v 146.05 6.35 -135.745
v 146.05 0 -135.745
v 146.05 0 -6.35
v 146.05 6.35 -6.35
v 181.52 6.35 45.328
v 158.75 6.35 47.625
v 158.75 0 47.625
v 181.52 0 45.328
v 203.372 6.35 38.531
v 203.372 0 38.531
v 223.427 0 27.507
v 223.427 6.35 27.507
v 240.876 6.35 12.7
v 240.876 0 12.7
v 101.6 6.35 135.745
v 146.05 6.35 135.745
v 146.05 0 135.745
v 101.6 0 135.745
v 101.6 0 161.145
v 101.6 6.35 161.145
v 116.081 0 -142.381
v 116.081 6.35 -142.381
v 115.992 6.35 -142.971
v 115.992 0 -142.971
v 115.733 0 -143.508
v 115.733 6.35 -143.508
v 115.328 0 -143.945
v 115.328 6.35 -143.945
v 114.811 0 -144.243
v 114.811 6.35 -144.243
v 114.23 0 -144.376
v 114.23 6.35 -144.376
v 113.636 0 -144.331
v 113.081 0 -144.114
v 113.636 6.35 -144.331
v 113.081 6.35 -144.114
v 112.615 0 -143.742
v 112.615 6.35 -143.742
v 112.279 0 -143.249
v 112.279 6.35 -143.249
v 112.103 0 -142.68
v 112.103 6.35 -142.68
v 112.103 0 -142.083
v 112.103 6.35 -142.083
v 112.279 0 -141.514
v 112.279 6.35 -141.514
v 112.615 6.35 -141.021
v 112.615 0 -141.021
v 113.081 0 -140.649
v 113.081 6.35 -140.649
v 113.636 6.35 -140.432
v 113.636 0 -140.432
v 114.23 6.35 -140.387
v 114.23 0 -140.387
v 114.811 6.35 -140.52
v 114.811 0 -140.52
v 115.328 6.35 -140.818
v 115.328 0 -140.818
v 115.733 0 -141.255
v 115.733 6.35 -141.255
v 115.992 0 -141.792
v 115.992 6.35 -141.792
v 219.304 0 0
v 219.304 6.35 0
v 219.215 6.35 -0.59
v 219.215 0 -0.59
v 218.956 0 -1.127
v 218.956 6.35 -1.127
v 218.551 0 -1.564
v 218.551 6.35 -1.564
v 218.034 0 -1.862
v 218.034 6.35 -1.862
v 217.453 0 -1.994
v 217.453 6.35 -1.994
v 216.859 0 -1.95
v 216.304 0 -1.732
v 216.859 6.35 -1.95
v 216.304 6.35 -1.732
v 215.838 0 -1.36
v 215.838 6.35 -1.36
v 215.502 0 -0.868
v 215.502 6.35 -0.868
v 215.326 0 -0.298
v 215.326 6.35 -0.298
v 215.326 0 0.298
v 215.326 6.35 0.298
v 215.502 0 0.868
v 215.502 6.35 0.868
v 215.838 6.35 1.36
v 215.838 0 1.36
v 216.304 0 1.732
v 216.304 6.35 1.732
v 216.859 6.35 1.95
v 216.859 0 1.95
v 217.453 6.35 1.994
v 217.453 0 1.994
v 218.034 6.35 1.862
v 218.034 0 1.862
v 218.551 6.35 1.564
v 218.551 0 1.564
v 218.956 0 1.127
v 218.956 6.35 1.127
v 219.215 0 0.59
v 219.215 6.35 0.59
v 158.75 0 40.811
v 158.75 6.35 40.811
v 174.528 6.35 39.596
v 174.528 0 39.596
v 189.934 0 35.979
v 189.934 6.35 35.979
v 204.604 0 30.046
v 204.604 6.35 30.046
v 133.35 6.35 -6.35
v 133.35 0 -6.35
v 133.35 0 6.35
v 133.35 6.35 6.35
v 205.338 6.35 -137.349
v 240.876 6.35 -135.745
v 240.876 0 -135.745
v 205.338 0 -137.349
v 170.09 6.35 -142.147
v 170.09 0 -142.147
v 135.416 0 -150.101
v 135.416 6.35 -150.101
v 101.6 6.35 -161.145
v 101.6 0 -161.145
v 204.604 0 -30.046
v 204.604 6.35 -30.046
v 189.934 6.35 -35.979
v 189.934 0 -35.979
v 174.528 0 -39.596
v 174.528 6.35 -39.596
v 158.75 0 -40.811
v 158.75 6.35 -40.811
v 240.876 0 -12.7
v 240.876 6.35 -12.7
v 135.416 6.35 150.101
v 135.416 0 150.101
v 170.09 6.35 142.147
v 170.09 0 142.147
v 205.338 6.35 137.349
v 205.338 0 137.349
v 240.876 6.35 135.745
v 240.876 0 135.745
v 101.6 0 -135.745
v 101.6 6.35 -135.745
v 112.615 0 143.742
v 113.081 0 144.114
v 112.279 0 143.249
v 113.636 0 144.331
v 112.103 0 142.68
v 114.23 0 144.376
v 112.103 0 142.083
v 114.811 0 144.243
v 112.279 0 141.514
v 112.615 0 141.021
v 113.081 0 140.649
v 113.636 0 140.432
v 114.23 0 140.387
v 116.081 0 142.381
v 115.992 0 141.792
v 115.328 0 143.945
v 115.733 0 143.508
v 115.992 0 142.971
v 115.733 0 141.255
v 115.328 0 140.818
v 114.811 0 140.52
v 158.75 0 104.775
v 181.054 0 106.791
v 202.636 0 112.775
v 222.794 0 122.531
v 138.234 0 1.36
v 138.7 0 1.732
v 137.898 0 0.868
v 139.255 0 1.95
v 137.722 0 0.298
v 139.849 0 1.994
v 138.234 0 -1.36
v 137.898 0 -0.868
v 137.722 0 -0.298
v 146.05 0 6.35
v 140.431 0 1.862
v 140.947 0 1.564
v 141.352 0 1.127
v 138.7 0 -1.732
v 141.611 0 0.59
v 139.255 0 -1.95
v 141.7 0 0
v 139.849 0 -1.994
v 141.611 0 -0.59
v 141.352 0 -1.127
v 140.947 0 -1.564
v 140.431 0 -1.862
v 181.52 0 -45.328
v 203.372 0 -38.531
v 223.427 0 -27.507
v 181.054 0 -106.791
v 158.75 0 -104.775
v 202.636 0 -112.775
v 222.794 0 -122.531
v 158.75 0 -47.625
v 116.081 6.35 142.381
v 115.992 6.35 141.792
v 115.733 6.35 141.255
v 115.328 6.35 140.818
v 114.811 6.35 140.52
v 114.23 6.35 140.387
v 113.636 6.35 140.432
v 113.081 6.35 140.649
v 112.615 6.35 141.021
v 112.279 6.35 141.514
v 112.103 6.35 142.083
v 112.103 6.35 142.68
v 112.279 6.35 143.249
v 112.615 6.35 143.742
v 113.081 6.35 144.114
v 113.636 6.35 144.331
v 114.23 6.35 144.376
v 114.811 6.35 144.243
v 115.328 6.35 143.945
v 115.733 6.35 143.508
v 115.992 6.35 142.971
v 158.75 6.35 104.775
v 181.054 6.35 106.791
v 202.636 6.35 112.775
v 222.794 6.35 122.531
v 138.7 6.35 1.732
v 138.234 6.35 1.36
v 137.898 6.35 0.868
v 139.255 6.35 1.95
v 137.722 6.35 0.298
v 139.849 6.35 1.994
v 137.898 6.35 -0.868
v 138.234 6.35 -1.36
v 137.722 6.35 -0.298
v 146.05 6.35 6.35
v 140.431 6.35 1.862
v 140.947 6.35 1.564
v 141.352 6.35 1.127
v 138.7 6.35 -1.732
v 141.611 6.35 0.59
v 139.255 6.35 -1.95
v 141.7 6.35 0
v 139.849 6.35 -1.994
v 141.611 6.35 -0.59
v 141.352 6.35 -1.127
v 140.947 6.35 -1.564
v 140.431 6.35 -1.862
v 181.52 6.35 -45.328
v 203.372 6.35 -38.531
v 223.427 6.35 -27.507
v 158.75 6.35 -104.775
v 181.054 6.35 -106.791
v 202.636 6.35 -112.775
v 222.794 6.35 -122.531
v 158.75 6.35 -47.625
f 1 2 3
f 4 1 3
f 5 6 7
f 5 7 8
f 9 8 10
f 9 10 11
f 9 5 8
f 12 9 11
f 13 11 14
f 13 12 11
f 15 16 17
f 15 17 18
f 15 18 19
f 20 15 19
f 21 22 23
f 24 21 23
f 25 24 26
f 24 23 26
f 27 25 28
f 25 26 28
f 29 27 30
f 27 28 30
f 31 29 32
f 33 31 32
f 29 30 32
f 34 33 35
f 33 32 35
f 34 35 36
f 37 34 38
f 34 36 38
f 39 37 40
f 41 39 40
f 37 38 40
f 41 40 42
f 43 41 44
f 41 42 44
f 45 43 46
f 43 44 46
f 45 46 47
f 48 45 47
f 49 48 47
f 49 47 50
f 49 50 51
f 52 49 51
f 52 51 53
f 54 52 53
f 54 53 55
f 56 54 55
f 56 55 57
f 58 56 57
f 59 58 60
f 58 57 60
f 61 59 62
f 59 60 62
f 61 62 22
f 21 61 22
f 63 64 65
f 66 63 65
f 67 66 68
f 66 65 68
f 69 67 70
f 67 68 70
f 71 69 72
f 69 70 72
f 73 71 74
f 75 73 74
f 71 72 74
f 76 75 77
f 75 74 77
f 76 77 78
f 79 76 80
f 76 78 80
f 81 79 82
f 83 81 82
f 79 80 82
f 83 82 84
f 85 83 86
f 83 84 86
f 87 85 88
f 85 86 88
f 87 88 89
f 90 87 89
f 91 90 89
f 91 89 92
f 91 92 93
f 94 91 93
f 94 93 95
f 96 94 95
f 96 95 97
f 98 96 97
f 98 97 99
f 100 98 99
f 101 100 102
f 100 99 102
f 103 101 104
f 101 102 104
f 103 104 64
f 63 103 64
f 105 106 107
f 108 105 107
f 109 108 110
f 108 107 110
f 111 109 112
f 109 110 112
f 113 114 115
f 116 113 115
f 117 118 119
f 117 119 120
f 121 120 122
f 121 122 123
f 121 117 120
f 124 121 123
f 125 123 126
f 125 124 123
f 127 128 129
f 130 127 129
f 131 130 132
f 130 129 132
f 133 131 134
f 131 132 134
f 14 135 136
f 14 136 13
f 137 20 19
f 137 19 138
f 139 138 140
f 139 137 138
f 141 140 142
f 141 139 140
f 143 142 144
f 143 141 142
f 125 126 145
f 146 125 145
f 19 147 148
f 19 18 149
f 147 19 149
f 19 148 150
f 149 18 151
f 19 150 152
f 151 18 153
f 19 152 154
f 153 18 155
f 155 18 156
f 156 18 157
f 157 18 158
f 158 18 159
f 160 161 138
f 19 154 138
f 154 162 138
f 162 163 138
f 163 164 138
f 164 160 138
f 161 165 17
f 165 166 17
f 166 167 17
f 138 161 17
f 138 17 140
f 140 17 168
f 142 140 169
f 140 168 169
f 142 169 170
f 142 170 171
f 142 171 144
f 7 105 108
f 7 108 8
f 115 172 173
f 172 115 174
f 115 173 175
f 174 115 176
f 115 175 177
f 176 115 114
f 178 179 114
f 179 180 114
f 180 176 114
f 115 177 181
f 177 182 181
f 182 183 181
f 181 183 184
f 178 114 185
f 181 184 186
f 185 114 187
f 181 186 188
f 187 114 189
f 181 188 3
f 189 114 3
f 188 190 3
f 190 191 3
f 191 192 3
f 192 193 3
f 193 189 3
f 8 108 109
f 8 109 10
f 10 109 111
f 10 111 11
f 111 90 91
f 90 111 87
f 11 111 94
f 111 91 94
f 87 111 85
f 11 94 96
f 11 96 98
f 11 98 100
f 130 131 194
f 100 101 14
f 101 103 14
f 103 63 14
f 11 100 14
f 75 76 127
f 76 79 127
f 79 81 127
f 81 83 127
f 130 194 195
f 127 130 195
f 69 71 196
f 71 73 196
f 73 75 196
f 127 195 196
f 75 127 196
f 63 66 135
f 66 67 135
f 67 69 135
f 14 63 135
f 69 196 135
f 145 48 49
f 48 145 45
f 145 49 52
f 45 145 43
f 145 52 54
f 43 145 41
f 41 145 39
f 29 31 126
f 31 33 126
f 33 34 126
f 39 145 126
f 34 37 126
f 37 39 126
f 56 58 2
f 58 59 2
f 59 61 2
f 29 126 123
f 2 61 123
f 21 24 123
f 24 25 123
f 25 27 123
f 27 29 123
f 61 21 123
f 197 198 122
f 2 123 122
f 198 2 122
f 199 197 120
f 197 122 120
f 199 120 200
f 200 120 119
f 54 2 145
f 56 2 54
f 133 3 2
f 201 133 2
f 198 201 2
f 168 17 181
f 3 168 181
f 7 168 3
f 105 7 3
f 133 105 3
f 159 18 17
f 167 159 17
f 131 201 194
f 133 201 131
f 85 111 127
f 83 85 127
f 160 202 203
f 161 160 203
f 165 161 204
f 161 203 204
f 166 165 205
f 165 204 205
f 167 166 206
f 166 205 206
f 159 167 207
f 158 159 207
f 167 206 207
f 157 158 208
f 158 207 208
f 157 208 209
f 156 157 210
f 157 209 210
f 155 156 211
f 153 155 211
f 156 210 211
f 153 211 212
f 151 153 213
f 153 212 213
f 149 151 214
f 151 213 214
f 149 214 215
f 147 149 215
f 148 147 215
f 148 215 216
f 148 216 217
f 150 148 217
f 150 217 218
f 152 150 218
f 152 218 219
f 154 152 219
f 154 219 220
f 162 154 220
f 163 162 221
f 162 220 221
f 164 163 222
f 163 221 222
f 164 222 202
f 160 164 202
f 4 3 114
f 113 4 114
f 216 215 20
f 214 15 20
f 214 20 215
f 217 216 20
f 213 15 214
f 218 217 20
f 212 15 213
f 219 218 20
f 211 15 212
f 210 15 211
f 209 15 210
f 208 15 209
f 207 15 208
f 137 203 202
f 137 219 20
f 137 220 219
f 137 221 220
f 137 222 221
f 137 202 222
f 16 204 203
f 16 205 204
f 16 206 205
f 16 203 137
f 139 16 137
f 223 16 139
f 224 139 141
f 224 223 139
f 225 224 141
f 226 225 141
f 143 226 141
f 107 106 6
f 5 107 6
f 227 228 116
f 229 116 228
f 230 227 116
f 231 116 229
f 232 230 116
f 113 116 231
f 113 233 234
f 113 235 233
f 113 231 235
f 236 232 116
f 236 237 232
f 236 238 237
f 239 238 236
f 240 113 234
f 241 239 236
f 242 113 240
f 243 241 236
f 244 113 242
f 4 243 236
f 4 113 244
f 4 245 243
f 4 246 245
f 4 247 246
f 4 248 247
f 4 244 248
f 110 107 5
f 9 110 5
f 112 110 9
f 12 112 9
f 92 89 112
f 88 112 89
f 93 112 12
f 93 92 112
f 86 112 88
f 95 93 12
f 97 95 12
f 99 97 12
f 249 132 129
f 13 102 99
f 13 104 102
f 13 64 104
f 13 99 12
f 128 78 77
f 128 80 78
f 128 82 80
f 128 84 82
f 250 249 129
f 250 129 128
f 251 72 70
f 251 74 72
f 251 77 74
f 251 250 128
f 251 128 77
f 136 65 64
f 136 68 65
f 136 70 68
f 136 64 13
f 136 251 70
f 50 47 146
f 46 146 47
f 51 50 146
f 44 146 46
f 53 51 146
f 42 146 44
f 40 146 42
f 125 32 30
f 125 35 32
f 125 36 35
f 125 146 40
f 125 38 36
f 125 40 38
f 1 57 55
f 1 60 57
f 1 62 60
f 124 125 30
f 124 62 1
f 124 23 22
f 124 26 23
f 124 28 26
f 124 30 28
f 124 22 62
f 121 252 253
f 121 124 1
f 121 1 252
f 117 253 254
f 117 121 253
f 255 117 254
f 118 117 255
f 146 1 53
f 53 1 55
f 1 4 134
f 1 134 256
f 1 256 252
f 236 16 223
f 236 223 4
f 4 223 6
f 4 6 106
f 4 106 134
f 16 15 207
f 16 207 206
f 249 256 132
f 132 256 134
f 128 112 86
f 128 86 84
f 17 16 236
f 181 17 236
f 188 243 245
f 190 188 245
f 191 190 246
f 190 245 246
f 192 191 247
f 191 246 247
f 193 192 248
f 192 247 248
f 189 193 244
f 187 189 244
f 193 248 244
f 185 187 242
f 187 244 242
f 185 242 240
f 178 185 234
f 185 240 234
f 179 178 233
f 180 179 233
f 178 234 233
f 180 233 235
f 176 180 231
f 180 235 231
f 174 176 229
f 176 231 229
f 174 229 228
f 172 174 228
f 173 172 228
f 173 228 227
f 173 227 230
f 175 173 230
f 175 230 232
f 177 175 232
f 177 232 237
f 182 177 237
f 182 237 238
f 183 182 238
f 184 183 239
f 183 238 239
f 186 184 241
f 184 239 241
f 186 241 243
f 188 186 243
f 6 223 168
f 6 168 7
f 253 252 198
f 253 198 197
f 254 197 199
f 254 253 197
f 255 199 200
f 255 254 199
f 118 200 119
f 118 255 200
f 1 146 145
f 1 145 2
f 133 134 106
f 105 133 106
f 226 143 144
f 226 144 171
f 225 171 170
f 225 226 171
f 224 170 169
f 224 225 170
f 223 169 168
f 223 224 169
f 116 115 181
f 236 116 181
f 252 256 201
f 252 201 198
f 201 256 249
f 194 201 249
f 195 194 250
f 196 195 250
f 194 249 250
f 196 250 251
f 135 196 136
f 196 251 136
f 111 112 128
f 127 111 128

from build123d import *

# Parameters (mm, degrees)
BOSS_EXTRUDE3_DEPTH = 6.35
SKETCH2_R           = 2
CUT_EXTRUDE1_DEPTH  = 6.35
SKETCH3_W           = 44.45
SKETCH3_H           = 34.144934764
CUT_EXTRUDE2_DEPTH  = 6.35
BOSS_EXTRUDE5_DEPTH = 6.35
CUT_EXTRUDE3_DEPTH  = 6.35
CUT_EXTRUDE4_DEPTH  = 6.35
SKETCH8_R           = 2
CUT_EXTRUDE5_DEPTH  = 6.35


with BuildPart() as part:
    # Sketch1 → Boss-Extrude3 (new body)
    with BuildSketch(Plane(origin=(0, 0, 0), x_dir=(1, 0, 0), z_dir=(0, 1, 0))):
        with BuildLine():
            ThreePointArc((101.6, -161.144934764), (118.310930869, -149.307647617), (133.654639598, -135.744934764))
            Line((133.654639598, -135.744934764), (124.436872293, -135.744934764))
            Line((124.436872293, -135.744934764), (101.6, -135.744934764))
            Line((101.6, -135.744934764), (101.6, -161.144934764))
        make_face()
        with BuildLine():
            Line((146.05, -112.163363002), (146.05, -101.6))
            Line((146.05, -101.6), (101.6, -101.6))
            Line((101.6, -101.6), (101.6, -135.744934764))
            Line((101.6, -135.744934764), (124.436872293, -135.744934764))
            ThreePointArc((124.436872293, -135.744934764), (135.756435031, -124.424325787), (146.05, -112.163363002))
        make_face()
        with BuildLine():
            Line((152.4, -76.2), (152.4, -101.6))
            Line((152.4, -101.6), (157.687433266, -106.887433266))
            ThreePointArc((157.687433266, -106.887433266), (155.08800922, -110.62531083), (152.4, -114.3))
            ThreePointArc((152.4, -114.3), (143.428677452, -125.373300524), (133.654639598, -135.744934764))
            Line((133.654639598, -135.744934764), (190.5, -135.744934764))
            Line((190.5, -135.744934764), (240.876195248, -135.744934764))
            ThreePointArc((240.876195248, -135.744934764), (203.220744642, -110.47631512), (158.75, -101.6))
            Line((158.75, -101.6), (158.75, -76.2))
            Line((158.75, -76.2), (152.4, -76.2))
        make_face()
        with BuildLine():
            Line((146.05, -76.2), (152.4, -76.2))
            Line((152.4, -76.2), (152.4, -50.8))
            Line((152.4, -50.8), (190.076195248, -12.7))
            ThreePointArc((190.076195248, -12.7), (190.5, 0), (190.076195248, 12.7))
            Line((190.076195248, 12.7), (152.4, 50.8))
            Line((152.4, 50.8), (152.4, 76.2))
            Line((152.4, 76.2), (146.05, 76.2))
            Line((146.05, 76.2), (146.05, 6.35))
            Line((146.05, 6.35), (133.35, 6.35))
            Line((133.35, 6.35), (133.35, -6.35))
            Line((133.35, -6.35), (146.05, -6.35))
            Line((146.05, -6.35), (146.05, -76.2))
        make_face()
        with BuildLine():
            Line((157.687433266, -106.887433266), (152.4, -101.6))
            Line((152.4, -101.6), (152.4, -76.2))
            Line((152.4, -76.2), (146.05, -76.2))
            Line((146.05, -76.2), (146.05, -101.6))
            Line((146.05, -101.6), (146.05, -112.163363002))
            ThreePointArc((146.05, -112.163363002), (135.756435031, -124.424325787), (124.436872293, -135.744934764))
            Line((124.436872293, -135.744934764), (133.654639598, -135.744934764))
            ThreePointArc((133.654639598, -135.744934764), (143.428677452, -125.373300524), (152.4, -114.3))
            ThreePointArc((152.4, -114.3), (155.08800922, -110.62531083), (157.687433266, -106.887433266))
        make_face()
        with BuildLine():
            Line((101.6, 101.6), (146.05, 101.6))
            Line((146.05, 101.6), (146.05, 112.163363002))
            ThreePointArc((146.05, 112.163363002), (135.756435031, 124.424325787), (124.436872293, 135.744934764))
            Line((124.436872293, 135.744934764), (101.6, 135.744934764))
            Line((101.6, 135.744934764), (101.6, 101.6))
        make_face()
        with BuildLine():
            Line((124.436872293, 135.744934764), (133.654639598, 135.744934764))
            ThreePointArc((133.654639598, 135.744934764), (118.310930869, 149.307647617), (101.6, 161.144934764))
            Line((101.6, 161.144934764), (101.6, 135.744934764))
            Line((101.6, 135.744934764), (124.436872293, 135.744934764))
        make_face()
        with BuildLine():
            Line((146.05, 76.2), (152.4, 76.2))
            Line((152.4, 76.2), (152.4, 101.6))
            Line((152.4, 101.6), (157.687433266, 106.887433266))
            ThreePointArc((157.687433266, 106.887433266), (155.08800922, 110.62531083), (152.4, 114.3))
            ThreePointArc((152.4, 114.3), (143.428677452, 125.373300524), (133.654639598, 135.744934764))
            Line((133.654639598, 135.744934764), (124.436872293, 135.744934764))
            ThreePointArc((124.436872293, 135.744934764), (135.756435031, 124.424325787), (146.05, 112.163363002))
            Line((146.05, 112.163363002), (146.05, 101.6))
            Line((146.05, 101.6), (146.05, 76.2))
        make_face()
        with BuildLine():
            Line((152.4, 50.8), (190.076195248, 12.7))
            Line((190.076195248, 12.7), (240.876195248, 12.7))
            ThreePointArc((240.876195248, 12.7), (204.016770224, 40.811197813), (158.75, 50.8))
            Line((158.75, 50.8), (158.75, 76.2))
            Line((158.75, 76.2), (152.4, 76.2))
            Line((152.4, 76.2), (152.4, 50.8))
        make_face()
        with BuildLine():
            Line((152.4, -50.8), (152.4, -76.2))
            Line((152.4, -76.2), (158.75, -76.2))
            Line((158.75, -76.2), (158.75, -50.8))
            ThreePointArc((158.75, -50.8), (204.016770224, -40.811197813), (240.876195248, -12.7))
            Line((240.876195248, -12.7), (190.076195248, -12.7))
            Line((190.076195248, -12.7), (152.4, -50.8))
        make_face()
        with BuildLine():
            ThreePointArc((190.076195248, -12.7), (190.5, 0), (190.076195248, 12.7))
            Line((190.076195248, 12.7), (240.876195248, 12.7))
            Line((240.876195248, 12.7), (240.876195248, -12.7))
            Line((240.876195248, -12.7), (190.076195248, -12.7))
        make_face()
        with BuildLine():
            ThreePointArc((158.75, 101.6), (203.220744642, 110.47631512), (240.876195248, 135.744934764))
            Line((240.876195248, 135.744934764), (190.5, 135.744934764))
            Line((190.5, 135.744934764), (133.654639598, 135.744934764))
            ThreePointArc((133.654639598, 135.744934764), (143.428677452, 125.373300524), (152.4, 114.3))
            ThreePointArc((152.4, 114.3), (155.08800922, 110.62531083), (157.687433266, 106.887433266))
            Line((157.687433266, 106.887433266), (152.4, 101.6))
            Line((152.4, 101.6), (152.4, 76.2))
            Line((152.4, 76.2), (158.75, 76.2))
            Line((158.75, 76.2), (158.75, 101.6))
        make_face()
    extrude(amount=BOSS_EXTRUDE3_DEPTH)

    # Sketch2 → Cut-Extrude1 (cut)
    with BuildSketch(Plane(origin=(0, 6.35, 0), x_dir=(1, 0, 0), z_dir=(0, 1, 0))):
        with Locations((139.7, 0)):
            Circle(SKETCH2_R)
        with Locations((114.080664861, 142.381475953)):
            Circle(SKETCH2_R)
        with Locations((114.080664861, -142.381475953)):
            Circle(SKETCH2_R)
    extrude(amount=-CUT_EXTRUDE1_DEPTH, mode=Mode.SUBTRACT)

    # Sketch3 → Cut-Extrude2 (cut)
    with BuildSketch(Plane(origin=(0, 6.35, 0), x_dir=(1, 0, 0), z_dir=(0, 1, 0))):
        with Locations((123.825, 118.672467382)):
            Rectangle(SKETCH3_W, SKETCH3_H)
        with Locations((123.825, -118.672467382)):
            Rectangle(SKETCH3_W, SKETCH3_H)
    extrude(amount=-CUT_EXTRUDE2_DEPTH, mode=Mode.SUBTRACT)

    # Sketch4 → Boss-Extrude5 (add)
    with BuildSketch(Plane(origin=(0, 6.35, 0), x_dir=(1, 0, 0), z_dir=(0, 1, 0))):
        with BuildLine():
            Line((146.05, 135.744934764), (240.876195248, 135.744934764))
            ThreePointArc((240.876195248, 135.744934764), (170.089511185, 142.146873772), (101.6, 161.144934764))
            Line((101.6, 161.144934764), (133.654639598, 135.744934764))
            Line((133.654639598, 135.744934764), (146.05, 135.744934764))
        make_face()
        with BuildLine():
            ThreePointArc((101.6, -161.144934764), (170.089511185, -142.146873772), (240.876195248, -135.744934764))
            Line((240.876195248, -135.744934764), (146.05, -135.744934764))
            Line((146.05, -135.744934764), (133.654639598, -135.744934764))
            Line((133.654639598, -135.744934764), (101.6, -161.144934764))
        make_face()
    extrude(amount=-BOSS_EXTRUDE5_DEPTH)

    # Sketch6 → Cut-Extrude3 (cut)
    with BuildSketch(Plane(origin=(0, 6.35, 0), x_dir=(1, 0, 0), z_dir=(0, 1, 0))):
        with BuildLine():
            ThreePointArc((204.6037507, 30.046043954), (182.300238804, 38.083813069), (158.75, 40.811197813))
            Line((158.75, 40.811197813), (158.75, -40.811197813))
            ThreePointArc((158.75, -40.811197813), (182.300238804, -38.083813069), (204.6037507, -30.046043954))
            Line((204.6037507, -30.046043954), (204.6037507, 30.046043954))
        make_face()
    extrude(amount=-CUT_EXTRUDE3_DEPTH, mode=Mode.SUBTRACT)

    # Sketch7 → Cut-Extrude4 (cut)
    with BuildSketch(Plane(origin=(0, 6.35, 0), x_dir=(1, 0, 0), z_dir=(0, 1, 0))):
        with BuildLine():
            ThreePointArc((158.75, 104.775), (202.635785869, 112.774751554), (240.876195248, 135.744934764))
            ThreePointArc((240.876195248, 135.744934764), (203.220744642, 110.47631512), (158.75, 101.6))
            Line((158.75, 101.6), (158.75, 104.775))
        make_face()
        with BuildLine():
            Line((158.75, 50.8), (158.75, 47.625))
            ThreePointArc((158.75, 47.625), (203.371932866, 38.531106957), (240.876195248, 12.7))
            ThreePointArc((240.876195248, 12.7), (204.016770224, 40.811197813), (158.75, 50.8))
        make_face()
        with BuildLine():
            ThreePointArc((158.75, -47.625), (203.371932866, -38.531106957), (240.876195248, -12.7))
            ThreePointArc((240.876195248, -12.7), (204.016770224, -40.811197813), (158.75, -50.8))
            Line((158.75, -50.8), (158.75, -47.625))
        make_face()
        with BuildLine():
            Line((158.75, -104.775), (158.75, -101.6))
            ThreePointArc((158.75, -101.6), (203.220744642, -110.47631512), (240.876195248, -135.744934764))
            ThreePointArc((240.876195248, -135.744934764), (202.635785869, -112.774751554), (158.75, -104.775))
        make_face()
    extrude(amount=-CUT_EXTRUDE4_DEPTH, mode=Mode.SUBTRACT)

    # Sketch8 → Cut-Extrude5 (cut)
    with BuildSketch(Plane(origin=(0, 6.35, 0), x_dir=(1, 0, 0), z_dir=(0, 1, 0))):
        with Locations((217.3037507, 0)):
            Circle(SKETCH8_R)
    extrude(amount=-CUT_EXTRUDE5_DEPTH, mode=Mode.SUBTRACT)


solid = part.part
